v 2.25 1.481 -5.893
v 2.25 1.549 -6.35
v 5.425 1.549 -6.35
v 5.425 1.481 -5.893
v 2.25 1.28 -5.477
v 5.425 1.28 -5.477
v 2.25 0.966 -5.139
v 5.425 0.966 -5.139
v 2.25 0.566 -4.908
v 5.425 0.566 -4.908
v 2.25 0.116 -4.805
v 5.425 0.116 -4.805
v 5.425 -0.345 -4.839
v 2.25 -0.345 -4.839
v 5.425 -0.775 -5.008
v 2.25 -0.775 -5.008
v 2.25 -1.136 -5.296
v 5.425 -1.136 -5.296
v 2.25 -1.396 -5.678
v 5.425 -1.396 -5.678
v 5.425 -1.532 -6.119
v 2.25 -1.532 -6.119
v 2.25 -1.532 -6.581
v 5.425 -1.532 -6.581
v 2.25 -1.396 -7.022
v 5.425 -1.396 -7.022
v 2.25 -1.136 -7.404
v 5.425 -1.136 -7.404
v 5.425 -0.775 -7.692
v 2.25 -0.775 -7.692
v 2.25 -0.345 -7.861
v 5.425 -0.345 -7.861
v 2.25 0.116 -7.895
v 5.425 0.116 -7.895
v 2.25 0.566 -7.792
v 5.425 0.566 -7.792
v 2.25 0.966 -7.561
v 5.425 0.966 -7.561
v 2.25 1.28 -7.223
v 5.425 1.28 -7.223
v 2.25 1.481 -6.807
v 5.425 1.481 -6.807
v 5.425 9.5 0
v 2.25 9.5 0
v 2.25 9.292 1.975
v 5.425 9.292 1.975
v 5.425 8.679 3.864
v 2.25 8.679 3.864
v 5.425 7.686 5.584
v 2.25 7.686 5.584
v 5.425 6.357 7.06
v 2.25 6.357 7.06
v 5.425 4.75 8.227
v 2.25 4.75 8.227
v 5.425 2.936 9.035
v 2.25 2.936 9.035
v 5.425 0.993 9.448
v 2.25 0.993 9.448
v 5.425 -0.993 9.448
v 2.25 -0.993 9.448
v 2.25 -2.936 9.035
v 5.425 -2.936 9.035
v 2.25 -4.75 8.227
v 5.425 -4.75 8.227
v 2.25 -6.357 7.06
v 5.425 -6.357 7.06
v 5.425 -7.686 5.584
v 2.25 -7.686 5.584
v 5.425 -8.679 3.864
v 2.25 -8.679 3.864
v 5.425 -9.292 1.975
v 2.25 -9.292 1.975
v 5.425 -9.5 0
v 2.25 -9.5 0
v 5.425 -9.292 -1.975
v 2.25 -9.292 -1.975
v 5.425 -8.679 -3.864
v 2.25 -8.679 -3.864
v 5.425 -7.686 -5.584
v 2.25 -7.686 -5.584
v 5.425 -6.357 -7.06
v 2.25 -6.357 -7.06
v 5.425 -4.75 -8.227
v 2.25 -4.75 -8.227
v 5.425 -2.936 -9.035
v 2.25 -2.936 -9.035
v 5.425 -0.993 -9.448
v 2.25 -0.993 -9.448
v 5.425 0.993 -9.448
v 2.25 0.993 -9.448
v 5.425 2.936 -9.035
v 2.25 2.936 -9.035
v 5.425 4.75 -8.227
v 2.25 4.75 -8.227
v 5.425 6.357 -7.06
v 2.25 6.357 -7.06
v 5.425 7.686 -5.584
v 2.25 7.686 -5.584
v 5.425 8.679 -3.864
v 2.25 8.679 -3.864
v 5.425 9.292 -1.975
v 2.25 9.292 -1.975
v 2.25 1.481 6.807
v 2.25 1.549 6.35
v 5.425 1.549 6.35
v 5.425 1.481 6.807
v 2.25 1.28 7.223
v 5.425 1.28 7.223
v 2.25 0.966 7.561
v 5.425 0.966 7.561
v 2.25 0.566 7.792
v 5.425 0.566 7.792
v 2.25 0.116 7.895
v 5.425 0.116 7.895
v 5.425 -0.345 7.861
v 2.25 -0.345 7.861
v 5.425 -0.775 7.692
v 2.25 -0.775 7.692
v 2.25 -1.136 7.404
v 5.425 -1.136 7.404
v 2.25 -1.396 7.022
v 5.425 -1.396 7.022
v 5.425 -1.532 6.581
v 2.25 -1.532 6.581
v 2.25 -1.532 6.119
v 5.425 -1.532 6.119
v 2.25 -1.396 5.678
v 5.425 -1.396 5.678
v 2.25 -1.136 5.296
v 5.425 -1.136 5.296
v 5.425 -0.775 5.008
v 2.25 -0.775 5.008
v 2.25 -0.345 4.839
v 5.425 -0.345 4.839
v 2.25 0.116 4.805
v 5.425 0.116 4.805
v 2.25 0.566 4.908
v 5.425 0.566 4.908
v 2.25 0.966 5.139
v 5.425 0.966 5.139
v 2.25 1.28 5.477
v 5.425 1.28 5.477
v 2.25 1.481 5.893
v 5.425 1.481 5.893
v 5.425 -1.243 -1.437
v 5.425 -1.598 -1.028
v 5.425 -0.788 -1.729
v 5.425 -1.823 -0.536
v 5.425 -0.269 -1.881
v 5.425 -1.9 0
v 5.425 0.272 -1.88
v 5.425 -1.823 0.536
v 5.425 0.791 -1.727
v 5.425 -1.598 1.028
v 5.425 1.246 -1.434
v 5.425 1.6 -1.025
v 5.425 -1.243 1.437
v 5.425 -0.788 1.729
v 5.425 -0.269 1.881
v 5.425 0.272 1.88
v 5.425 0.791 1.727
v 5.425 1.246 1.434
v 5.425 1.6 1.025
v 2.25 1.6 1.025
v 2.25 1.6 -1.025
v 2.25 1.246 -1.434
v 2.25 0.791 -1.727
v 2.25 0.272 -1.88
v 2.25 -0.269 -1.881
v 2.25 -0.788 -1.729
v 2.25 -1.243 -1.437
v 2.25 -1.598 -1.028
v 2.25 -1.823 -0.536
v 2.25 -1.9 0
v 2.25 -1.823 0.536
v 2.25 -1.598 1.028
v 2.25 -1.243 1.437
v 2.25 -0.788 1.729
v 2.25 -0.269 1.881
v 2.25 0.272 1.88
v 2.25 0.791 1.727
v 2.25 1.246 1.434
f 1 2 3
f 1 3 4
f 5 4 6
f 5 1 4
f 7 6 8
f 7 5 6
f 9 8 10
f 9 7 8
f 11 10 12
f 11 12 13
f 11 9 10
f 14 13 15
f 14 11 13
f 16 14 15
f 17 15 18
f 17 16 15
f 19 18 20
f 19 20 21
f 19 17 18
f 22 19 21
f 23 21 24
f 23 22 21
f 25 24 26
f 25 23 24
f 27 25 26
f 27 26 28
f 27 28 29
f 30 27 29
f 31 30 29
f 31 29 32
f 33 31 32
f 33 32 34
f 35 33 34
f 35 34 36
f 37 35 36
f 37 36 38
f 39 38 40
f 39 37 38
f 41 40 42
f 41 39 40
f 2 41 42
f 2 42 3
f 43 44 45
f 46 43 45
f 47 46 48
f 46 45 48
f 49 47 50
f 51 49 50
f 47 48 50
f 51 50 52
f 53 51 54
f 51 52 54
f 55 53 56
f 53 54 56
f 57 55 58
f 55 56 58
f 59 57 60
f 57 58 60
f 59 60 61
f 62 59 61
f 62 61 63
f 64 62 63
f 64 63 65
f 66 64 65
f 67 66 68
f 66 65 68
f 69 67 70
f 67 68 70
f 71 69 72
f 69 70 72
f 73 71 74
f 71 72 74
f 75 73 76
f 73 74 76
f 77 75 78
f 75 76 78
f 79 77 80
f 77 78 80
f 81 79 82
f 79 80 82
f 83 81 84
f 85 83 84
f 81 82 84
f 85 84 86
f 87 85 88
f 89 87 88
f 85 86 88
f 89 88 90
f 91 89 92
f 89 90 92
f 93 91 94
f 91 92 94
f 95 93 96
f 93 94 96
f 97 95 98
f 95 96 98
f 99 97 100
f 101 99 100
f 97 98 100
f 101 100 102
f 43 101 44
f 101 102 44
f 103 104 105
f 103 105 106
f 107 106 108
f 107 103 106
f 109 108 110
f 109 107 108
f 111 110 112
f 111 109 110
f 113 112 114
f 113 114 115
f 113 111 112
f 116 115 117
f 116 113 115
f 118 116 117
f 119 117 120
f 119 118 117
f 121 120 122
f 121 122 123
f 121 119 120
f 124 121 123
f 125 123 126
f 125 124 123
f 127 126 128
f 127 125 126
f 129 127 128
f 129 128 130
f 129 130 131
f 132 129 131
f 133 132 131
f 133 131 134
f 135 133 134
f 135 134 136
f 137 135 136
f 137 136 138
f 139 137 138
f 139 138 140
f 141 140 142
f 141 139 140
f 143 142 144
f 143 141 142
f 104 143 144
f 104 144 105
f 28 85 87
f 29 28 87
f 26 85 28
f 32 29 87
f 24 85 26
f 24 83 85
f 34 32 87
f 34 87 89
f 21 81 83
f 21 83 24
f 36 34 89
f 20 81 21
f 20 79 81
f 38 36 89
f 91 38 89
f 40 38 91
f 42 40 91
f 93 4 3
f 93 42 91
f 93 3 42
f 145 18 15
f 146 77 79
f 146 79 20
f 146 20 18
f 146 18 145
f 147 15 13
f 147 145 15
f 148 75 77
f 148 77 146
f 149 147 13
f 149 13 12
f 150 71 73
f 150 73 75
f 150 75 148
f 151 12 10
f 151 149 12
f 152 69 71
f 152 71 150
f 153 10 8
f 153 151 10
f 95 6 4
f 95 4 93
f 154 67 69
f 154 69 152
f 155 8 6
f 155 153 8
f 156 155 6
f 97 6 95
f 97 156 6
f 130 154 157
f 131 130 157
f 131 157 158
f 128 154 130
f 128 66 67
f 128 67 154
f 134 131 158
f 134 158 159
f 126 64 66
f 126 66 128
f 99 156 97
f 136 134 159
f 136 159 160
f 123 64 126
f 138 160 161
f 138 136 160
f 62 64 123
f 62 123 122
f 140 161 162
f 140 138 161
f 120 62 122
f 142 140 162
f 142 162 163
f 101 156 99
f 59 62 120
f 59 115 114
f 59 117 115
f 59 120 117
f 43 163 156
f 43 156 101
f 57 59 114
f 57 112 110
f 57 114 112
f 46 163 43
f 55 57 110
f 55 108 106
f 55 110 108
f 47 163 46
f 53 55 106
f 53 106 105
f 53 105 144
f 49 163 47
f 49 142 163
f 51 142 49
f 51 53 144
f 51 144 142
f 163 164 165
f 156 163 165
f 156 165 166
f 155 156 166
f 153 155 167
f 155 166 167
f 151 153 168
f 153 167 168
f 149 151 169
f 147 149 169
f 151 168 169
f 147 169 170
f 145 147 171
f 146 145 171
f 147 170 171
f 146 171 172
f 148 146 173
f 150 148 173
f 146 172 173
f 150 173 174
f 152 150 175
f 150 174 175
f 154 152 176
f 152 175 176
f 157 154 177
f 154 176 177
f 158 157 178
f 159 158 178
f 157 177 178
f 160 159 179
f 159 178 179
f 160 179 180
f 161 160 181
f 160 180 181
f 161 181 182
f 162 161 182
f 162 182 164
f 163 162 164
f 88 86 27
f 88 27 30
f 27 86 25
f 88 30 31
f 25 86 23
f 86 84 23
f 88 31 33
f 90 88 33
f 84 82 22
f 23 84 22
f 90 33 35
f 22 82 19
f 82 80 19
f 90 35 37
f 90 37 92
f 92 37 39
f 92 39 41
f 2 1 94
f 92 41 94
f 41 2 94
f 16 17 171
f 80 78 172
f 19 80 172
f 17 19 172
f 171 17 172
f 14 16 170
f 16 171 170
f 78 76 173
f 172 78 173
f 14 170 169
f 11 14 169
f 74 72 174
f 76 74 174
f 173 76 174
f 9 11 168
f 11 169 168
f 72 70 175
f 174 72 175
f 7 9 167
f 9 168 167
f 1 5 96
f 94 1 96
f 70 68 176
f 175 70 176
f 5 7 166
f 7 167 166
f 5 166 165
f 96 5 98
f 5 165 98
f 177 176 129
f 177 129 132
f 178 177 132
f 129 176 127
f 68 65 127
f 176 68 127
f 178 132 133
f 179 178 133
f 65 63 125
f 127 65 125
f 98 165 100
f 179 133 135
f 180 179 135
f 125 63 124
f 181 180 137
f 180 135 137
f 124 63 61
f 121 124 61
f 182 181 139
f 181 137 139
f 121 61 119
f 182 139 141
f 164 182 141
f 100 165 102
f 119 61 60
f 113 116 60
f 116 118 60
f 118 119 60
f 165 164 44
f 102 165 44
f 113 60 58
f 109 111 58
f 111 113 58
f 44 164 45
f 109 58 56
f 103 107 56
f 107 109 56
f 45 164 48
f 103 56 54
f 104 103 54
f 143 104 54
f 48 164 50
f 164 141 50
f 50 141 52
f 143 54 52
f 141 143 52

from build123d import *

# Parameters (mm, degrees)
SKETCH1_R           = 9.5
SKETCH1_R_2         = 1.5494
BOSS_EXTRUDE1_DEPTH = 3.175


# Read off the part's stored shape, not the designer's step: Imported1
with BuildPart() as part:
    # Sketch1 → Boss-Extrude1 (new body)
    with BuildSketch(Plane(origin=(2.25, 0, 0), x_dir=(0, 0, -1), z_dir=(1, 0, 0))):
        with Locations(Location((0, 0, 0), (0, 0, 90))):
            Circle(SKETCH1_R)
        with Locations(Location((-6.35, 0, 0), (0, 0, 90))):
            Circle(SKETCH1_R_2, mode=Mode.SUBTRACT)
        with Locations(Location((6.35, 0, 0), (0, 0, 90))):
            Circle(SKETCH1_R_2, mode=Mode.SUBTRACT)
        with BuildLine():
            Line((-1.024695077, 1.6), (1.024695077, 1.6))
            ThreePointArc((1.024695077, 1.6), (0, -1.9), (-1.024695077, 1.6))
        make_face(mode=Mode.SUBTRACT)
    extrude(amount=BOSS_EXTRUDE1_DEPTH)


solid = part.part
